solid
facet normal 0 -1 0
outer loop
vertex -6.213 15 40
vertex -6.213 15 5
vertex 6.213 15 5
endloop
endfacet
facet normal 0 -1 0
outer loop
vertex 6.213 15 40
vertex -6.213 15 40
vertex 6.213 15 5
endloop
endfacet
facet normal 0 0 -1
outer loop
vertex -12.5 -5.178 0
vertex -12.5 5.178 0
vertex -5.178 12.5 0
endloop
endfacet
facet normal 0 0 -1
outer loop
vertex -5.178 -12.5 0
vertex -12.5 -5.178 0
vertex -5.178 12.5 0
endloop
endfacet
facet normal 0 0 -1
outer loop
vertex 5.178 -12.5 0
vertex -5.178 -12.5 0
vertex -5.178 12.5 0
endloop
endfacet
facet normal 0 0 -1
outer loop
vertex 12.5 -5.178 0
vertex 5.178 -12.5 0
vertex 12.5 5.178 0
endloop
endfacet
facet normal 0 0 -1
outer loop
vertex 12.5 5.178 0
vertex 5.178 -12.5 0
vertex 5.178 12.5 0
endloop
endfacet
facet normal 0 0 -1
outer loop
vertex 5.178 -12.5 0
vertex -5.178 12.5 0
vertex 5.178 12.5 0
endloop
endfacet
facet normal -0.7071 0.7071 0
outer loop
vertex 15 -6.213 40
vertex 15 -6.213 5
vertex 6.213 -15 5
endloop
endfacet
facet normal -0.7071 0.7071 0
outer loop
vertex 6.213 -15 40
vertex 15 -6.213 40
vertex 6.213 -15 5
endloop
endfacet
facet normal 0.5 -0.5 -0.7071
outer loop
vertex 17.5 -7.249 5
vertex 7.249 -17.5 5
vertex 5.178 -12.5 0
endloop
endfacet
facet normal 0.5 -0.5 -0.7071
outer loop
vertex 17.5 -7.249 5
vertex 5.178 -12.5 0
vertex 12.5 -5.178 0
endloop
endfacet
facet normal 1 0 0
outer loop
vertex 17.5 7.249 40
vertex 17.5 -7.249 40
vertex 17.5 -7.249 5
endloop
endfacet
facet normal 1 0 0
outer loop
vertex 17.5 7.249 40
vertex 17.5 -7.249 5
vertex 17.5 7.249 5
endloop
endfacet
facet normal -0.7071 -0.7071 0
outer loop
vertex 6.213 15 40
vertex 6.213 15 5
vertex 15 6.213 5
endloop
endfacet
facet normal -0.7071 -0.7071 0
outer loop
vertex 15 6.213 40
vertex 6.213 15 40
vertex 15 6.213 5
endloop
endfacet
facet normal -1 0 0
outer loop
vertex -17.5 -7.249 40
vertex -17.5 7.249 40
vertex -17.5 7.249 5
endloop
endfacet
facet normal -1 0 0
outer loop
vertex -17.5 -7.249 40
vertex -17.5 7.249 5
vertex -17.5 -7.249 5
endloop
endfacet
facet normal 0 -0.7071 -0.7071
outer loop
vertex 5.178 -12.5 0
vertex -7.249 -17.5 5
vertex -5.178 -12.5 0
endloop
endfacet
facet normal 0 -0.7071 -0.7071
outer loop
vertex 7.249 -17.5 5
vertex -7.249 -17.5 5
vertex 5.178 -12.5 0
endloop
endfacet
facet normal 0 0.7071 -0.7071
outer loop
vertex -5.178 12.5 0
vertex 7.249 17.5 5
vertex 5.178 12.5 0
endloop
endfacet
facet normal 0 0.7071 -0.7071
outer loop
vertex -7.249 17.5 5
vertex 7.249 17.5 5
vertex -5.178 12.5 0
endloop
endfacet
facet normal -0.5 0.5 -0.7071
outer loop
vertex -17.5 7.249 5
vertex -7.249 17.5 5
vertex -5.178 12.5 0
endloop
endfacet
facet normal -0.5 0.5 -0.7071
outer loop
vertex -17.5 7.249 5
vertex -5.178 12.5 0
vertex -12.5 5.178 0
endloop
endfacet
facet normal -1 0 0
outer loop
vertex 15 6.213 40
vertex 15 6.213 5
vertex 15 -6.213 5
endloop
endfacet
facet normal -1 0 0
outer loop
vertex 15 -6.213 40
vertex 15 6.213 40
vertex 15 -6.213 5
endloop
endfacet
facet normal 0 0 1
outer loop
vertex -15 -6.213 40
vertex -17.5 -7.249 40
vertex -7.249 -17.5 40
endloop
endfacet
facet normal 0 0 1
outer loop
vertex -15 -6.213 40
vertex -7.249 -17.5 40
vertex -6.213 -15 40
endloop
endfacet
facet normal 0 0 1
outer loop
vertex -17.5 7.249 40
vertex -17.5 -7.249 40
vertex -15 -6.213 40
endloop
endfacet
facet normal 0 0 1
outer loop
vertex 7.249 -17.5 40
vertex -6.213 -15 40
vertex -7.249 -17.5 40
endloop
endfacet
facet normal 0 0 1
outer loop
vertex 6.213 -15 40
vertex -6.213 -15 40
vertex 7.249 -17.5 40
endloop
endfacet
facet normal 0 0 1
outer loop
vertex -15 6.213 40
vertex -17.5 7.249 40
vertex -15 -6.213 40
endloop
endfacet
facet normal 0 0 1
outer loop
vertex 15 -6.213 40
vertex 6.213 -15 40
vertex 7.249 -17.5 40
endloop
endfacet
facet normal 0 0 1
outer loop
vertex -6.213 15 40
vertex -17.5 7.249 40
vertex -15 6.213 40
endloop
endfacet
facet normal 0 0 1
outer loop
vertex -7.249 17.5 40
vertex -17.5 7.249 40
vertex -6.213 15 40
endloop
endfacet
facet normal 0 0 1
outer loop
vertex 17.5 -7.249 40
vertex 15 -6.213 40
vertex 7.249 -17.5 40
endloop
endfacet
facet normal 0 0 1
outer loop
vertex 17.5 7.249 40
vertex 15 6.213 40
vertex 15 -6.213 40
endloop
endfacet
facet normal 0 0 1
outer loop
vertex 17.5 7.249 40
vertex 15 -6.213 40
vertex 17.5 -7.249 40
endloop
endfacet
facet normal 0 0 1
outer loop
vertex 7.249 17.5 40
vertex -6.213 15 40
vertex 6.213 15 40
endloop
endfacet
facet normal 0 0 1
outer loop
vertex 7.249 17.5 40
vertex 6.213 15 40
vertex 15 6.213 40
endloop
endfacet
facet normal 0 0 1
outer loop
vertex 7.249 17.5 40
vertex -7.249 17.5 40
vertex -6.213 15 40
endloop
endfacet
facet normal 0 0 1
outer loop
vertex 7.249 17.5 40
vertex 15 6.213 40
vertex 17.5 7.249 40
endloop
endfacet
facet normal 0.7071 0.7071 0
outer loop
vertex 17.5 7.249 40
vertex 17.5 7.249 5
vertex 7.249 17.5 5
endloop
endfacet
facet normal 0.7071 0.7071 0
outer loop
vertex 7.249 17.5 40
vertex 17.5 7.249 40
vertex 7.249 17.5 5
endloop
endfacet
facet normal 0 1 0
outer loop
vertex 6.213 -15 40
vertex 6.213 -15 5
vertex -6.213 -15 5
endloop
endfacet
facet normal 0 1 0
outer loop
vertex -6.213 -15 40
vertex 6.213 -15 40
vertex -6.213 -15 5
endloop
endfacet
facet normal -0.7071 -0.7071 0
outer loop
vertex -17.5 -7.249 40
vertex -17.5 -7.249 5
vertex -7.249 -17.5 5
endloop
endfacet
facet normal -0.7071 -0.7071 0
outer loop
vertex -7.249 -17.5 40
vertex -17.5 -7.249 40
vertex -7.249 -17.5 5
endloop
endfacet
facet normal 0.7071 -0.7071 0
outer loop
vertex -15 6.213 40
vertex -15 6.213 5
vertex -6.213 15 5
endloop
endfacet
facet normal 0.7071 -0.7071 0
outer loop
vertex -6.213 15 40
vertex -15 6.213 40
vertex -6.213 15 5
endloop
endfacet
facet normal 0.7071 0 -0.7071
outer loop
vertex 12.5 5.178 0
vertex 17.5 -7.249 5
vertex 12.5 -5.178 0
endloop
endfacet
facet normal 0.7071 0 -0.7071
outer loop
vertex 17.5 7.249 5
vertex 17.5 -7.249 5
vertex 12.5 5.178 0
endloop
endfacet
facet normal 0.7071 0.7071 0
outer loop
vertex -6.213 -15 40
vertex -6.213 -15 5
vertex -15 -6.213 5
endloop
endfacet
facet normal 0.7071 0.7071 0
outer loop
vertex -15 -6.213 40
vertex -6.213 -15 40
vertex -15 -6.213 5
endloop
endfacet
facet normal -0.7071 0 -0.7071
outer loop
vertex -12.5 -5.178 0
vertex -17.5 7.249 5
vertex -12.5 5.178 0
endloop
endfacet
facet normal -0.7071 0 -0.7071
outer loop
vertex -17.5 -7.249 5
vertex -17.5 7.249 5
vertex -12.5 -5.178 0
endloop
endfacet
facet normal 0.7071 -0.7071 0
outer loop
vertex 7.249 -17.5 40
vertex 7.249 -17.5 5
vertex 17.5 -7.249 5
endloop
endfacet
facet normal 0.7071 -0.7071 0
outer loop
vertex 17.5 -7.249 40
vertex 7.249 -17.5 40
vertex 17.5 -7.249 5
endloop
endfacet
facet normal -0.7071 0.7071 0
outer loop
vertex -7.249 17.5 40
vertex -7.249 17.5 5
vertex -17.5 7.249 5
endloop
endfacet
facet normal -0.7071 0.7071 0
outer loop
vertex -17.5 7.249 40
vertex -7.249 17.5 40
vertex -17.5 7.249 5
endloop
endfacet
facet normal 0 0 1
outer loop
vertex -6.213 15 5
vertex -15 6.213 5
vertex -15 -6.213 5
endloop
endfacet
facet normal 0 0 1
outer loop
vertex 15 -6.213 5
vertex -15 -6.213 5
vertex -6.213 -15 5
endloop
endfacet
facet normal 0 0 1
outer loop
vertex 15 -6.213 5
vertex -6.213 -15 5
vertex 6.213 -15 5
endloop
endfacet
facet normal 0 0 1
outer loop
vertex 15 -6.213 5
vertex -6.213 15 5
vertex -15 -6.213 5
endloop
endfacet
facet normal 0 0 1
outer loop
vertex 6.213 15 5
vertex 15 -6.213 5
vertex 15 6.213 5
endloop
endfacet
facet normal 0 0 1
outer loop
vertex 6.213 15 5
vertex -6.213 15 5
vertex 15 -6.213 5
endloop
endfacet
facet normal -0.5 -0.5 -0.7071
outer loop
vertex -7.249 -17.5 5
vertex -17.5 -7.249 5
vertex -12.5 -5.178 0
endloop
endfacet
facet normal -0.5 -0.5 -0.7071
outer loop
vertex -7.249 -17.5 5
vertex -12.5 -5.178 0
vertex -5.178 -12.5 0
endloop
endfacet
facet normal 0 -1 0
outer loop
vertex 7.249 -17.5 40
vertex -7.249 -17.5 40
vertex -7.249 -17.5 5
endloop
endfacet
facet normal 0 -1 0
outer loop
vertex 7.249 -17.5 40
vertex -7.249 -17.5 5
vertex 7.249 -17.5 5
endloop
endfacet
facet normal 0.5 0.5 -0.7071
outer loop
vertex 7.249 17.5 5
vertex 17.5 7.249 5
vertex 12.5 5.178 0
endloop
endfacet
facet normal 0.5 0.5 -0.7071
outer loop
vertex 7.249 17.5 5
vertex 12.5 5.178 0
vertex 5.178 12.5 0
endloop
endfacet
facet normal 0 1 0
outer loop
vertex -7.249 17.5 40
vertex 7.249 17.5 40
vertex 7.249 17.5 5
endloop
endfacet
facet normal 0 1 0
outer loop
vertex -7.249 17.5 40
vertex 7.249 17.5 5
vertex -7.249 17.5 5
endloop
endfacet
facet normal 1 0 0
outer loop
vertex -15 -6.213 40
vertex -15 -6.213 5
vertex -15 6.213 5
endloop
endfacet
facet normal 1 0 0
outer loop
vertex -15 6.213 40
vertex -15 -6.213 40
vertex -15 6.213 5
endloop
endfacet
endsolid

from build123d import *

# Parameters (mm, degrees)
F1_DEPTH = 40
F2_DEPTH = 5
F3_SIZE  = 5


with BuildPart() as f1:
    # F0 (on Top) → F1 (new body)
    with BuildSketch(Plane.XY):
        Polygon((-17.5, 7.248737), (-17.5, -7.248737), (-7.248737, -17.5), (7.248737, -17.5), (17.5, -7.248737), (17.5, 7.248737), (7.248737, 17.5), (-7.248737, 17.5), align=None)
        Polygon((-6.213203, -15), (-15, -6.213203), (-15, 6.213203), (-6.213203, 15), (6.213203, 15), (15, 6.213203), (15, -6.213203), (6.213203, -15), align=None, mode=Mode.SUBTRACT)
    extrude(amount=F1_DEPTH)

    # F0 (on Top) → F2 (join)
    with BuildSketch(Plane.XY):
        Polygon((-15, 6.213203), (-15, -6.213203), (-6.213203, -15), (6.213203, -15), (15, -6.213203), (15, 6.213203), (6.213203, 15), (-6.213203, 15), align=None)
    extrude(amount=F2_DEPTH)

    # F3
    f3_edges = [f1.edges().sort_by_distance(p)[0] for p in [
        (12.374369, -12.374369, 0),
        (0, -17.5, 0),
        (17.5, 0, 0),
        (12.374369, 12.374369, 0),
        (0, 17.5, 0),
        (-12.374369, 12.374369, 0),
        (-17.5, 0, 0),
        (-12.374369, -12.374369, 0),
    ]]
    chamfer(f3_edges, length=F3_SIZE)


solid = f1.part
